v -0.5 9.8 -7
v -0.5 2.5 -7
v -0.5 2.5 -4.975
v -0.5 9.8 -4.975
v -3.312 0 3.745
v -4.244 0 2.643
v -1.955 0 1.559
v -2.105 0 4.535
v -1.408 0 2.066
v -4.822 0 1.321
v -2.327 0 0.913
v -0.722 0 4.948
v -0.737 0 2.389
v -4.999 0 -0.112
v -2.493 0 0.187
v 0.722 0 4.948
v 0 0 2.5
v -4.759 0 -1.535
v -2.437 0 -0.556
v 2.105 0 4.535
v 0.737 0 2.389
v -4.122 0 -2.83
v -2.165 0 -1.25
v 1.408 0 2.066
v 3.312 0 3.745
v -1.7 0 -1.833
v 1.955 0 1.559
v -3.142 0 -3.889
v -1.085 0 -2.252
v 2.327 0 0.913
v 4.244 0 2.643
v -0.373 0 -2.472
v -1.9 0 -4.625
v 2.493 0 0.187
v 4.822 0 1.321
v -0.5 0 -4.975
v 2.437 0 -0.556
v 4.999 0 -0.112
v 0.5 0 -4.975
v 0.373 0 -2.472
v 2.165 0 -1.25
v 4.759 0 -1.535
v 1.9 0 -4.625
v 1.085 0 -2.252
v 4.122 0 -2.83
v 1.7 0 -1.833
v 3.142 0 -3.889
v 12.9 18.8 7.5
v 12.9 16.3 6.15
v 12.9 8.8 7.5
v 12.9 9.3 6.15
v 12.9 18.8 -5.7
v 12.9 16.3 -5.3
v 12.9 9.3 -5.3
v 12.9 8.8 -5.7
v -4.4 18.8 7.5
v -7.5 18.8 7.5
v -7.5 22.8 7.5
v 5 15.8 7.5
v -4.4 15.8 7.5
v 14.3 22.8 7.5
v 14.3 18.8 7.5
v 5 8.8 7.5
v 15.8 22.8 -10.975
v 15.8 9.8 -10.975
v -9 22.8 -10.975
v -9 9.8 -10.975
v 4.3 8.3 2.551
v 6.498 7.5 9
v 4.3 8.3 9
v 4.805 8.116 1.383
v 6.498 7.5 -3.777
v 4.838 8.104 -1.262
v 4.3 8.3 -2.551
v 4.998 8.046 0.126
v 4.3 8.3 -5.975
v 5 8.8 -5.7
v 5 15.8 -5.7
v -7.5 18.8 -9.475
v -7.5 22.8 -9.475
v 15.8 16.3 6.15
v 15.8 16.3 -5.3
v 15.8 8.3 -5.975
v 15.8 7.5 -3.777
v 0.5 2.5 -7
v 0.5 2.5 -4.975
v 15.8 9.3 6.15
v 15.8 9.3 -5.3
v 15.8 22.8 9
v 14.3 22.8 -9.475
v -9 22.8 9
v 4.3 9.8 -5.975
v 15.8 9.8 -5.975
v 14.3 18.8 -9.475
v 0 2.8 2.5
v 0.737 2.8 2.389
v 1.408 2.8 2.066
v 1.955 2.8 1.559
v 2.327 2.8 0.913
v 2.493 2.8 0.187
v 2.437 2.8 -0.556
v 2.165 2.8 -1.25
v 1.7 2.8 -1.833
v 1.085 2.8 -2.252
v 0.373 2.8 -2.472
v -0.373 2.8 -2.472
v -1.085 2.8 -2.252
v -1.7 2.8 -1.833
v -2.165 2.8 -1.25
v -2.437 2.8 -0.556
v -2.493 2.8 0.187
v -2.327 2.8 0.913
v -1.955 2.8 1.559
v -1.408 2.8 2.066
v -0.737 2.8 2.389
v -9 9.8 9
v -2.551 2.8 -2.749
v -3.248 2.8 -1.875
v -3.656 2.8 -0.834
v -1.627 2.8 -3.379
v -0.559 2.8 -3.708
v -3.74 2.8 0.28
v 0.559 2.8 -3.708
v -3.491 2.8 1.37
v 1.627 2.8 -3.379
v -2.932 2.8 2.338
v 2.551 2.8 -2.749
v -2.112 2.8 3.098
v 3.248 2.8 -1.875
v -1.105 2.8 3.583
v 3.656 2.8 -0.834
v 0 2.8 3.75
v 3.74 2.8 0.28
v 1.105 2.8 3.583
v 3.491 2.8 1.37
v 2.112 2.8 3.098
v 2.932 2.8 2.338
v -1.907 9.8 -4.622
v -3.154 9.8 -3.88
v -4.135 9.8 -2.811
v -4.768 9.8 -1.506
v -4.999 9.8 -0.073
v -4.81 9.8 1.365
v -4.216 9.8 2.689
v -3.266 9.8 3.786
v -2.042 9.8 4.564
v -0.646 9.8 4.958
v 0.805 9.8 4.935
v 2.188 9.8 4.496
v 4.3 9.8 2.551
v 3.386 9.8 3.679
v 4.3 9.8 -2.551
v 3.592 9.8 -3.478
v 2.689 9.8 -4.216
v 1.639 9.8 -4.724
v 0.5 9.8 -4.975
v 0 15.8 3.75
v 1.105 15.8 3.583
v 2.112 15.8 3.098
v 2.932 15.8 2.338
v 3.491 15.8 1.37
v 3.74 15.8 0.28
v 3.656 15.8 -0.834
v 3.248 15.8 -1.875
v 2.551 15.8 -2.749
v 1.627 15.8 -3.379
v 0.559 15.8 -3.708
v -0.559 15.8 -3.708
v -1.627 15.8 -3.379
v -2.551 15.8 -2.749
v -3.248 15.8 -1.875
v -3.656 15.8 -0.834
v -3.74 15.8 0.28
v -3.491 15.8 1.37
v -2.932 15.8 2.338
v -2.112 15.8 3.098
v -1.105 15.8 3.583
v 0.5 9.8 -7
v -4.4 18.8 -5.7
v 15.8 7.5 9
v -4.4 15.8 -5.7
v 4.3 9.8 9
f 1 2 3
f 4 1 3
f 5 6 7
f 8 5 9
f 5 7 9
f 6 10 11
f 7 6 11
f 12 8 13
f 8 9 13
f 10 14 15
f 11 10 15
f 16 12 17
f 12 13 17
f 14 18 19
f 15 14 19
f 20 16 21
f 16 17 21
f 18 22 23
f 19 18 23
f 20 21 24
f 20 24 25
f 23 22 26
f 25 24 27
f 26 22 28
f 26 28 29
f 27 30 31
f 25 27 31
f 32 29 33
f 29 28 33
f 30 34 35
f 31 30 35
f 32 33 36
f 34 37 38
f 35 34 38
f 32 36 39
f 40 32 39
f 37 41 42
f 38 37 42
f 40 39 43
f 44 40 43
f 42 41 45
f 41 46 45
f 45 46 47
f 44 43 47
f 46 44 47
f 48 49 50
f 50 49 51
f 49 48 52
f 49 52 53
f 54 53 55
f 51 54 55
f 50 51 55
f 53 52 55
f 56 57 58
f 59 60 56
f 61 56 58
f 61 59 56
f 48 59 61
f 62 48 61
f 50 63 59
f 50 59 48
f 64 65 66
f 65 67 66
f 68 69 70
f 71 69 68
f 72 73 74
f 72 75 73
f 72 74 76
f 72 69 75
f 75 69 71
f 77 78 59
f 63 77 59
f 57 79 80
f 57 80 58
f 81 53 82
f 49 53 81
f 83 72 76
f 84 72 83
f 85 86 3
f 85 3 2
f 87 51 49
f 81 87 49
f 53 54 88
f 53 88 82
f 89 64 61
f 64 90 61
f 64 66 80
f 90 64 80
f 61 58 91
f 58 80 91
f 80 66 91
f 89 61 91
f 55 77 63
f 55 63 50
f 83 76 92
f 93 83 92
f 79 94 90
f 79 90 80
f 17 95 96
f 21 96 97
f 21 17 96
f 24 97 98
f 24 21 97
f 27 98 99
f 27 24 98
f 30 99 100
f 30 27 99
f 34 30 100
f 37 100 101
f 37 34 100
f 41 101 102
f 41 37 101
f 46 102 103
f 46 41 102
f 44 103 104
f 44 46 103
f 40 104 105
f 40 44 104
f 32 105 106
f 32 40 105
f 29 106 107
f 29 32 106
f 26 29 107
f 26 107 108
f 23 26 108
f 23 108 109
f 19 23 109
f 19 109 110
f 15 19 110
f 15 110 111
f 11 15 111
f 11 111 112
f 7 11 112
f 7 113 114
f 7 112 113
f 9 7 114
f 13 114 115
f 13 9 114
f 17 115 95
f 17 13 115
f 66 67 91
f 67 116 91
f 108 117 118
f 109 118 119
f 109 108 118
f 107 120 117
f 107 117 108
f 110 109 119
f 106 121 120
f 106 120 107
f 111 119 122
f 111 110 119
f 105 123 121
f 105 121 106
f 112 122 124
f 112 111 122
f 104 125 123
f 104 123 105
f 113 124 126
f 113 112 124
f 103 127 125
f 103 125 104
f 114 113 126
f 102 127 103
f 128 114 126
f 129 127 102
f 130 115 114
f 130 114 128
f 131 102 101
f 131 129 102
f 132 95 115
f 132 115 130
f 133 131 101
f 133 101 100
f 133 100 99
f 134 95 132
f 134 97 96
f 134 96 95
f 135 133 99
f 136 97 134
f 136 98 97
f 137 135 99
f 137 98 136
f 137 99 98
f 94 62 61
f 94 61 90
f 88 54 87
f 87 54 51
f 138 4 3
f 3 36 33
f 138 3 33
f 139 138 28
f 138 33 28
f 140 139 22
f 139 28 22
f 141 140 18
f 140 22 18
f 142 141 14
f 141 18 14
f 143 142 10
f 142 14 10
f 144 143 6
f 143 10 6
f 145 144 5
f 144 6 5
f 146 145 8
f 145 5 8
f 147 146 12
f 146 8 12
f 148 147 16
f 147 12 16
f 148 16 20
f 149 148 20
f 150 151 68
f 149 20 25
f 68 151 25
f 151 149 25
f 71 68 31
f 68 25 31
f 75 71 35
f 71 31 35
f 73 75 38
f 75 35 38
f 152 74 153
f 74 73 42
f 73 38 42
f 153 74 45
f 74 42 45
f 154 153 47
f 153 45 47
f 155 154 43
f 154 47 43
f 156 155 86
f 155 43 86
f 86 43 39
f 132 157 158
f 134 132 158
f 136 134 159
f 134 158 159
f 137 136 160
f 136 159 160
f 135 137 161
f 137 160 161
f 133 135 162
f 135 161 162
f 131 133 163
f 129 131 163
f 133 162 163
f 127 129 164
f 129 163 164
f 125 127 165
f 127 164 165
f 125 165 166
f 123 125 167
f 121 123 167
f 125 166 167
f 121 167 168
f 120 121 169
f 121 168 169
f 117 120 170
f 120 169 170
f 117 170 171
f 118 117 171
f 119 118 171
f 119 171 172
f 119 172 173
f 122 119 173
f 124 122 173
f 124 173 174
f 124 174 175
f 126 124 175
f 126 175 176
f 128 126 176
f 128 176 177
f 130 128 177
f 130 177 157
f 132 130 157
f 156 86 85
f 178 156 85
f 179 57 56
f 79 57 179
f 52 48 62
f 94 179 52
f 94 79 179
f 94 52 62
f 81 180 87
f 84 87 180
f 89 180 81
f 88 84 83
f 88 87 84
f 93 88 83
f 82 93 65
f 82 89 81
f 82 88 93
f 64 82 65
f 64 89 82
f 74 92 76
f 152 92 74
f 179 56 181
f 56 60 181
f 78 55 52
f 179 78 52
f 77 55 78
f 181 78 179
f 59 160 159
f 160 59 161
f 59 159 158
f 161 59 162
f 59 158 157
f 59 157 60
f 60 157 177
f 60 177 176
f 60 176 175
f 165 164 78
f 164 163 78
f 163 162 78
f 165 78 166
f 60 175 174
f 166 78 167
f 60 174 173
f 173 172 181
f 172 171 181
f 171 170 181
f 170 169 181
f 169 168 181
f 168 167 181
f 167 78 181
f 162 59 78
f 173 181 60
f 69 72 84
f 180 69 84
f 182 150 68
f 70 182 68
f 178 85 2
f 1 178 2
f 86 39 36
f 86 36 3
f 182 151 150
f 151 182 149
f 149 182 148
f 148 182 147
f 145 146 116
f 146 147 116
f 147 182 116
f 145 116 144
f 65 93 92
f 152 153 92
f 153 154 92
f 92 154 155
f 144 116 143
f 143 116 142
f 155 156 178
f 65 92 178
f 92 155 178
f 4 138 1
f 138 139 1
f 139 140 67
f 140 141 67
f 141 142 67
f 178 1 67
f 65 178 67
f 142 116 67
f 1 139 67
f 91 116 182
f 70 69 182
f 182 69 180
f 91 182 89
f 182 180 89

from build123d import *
from OCP.BRepFilletAPI import BRepFilletAPI_MakeChamfer

# Parameters (mm, degrees)
SKETCH1_R            = 4.999999999999999
SKETCH1_R_2          = 2.5
BOSS_EXTRUDE1_DEPTH  = 15.8
SKETCH2_R            = 3.75
CUT_EXTRUDE1_DEPTH   = 13
CUT_EXTRUDE2_DEPTH   = 19.135324645563973
BOSS_EXTRUDE3_DEPTH  = 1
BOSS_EXTRUDE4_DEPTH  = 1
SKETCH13_R           = 5
BOSS_EXTRUDE7_DEPTH  = 10
CUT_EXTRUDE3_START   = -4
CUT_EXTRUDE3_DEPTH   = 4
CUT_EXTRUDE4_DEPTH   = 1
BOSS_EXTRUDE9_DEPTH  = 3
CUT_EXTRUDE6_DEPTH   = 7
BOSS_EXTRUDE10_DEPTH = 3
BOSS_EXTRUDE11_DEPTH = 2
CUT_EXTRUDE7_DEPTH   = 0.25
BOSS_EXTRUDE12_DEPTH = 1
SKETCH23_W           = 18.9749371855331
SKETCH23_H           = 13
BOSS_EXTRUDE13_DEPTH = 1
SKETCH24_W           = 23.799999999999997
SKETCH24_H           = 13
BOSS_EXTRUDE14_DEPTH = 1
BOSS_EXTRUDE15_DEPTH = 1
SKETCH26_W           = 11.45
SKETCH26_H           = 6.999999999999998
SKETCH26_W_2         = 10.45
SKETCH26_H_2         = 5.999999999999998
CUT_EXTRUDE8_DEPTH   = 34.46489573009899
CUT_EXTRUDE10_DEPTH  = 0.7
CHAMFER4_SIZE        = 0.8
CHAMFER4_SIZE2       = 2.1979819355637176


with BuildPart() as part:
    # Sketch1 → Boss-Extrude1 (new body)
    # profile 1 of 2: a face of its own
    with BuildSketch(Plane(origin=(0, 0, 0), x_dir=(1, 0, 0), z_dir=(0, 1, 0))):
        with BuildLine():
            Line((-0.5, 7), (-0.5, 4.9749371855331))
            ThreePointArc((-0.5000000000000004, 4.974937185533099), (3.1e-16, 4.999999999999999), (0.49999999999999994, 4.974937185533099))
            Line((0.5, 4.9749371855331), (0.5, 7))
            Line((0.5, 7), (-0.5, 7))
        make_face()
    # profile 2 of 2: a face of its own
    with BuildSketch(Plane(origin=(0, 0, 0), x_dir=(1, 0, 0), z_dir=(0, 1, 0))):
        Circle(SKETCH1_R)
        with Locations(Location((0, 0, 0), (0, 0, 270))):
            Circle(SKETCH1_R_2, mode=Mode.SUBTRACT)
    extrude(amount=BOSS_EXTRUDE1_DEPTH)

    # Sketch2 → Cut-Extrude1 (cut)
    with BuildSketch(Plane(origin=(0, 15.8, 0), x_dir=(1, 0, 0), z_dir=(0, 1, 0))):
        with Locations(Location((0, 0, 0), (0, 0, 270))):
            Circle(SKETCH2_R)
    extrude(amount=-CUT_EXTRUDE1_DEPTH, mode=Mode.SUBTRACT)

    # Sketch4 → Cut-Extrude2 (cut, through all)
    with BuildSketch(Plane(origin=(0.5, 0, 0), x_dir=(0, 0, -1), z_dir=(1, 0, 0))):
        Polygon((7, 0), (4.9749371855331, 0), (4.9749371855331, 2.5000000000000004), (7, 2.5), align=None)
    extrude(amount=-CUT_EXTRUDE2_DEPTH, mode=Mode.SUBTRACT)

    # Sketch10 → Boss-Extrude3 (add)
    with BuildSketch(Plane(origin=(0.5, 0, 0), x_dir=(0, 0, -1), z_dir=(1, 0, 0))):
        Polygon((4.9749371855331, 15.8), (9.974937185533099, 15.8), (9.974937185533099, 9.8), (4.974937185533101, 9.8), align=None)
    extrude(amount=-BOSS_EXTRUDE3_DEPTH)

    # Sketch12 → Boss-Extrude4 (add)
    with BuildSketch(Plane(origin=(0, 15.8, 0), x_dir=(1, 0, 0), z_dir=(0, 1, 0))):
        with BuildLine():
            Line((-3.75, -3.307189138830739), (-3.75, 3.307189138830739))
            ThreePointArc((-3.75, 3.307189138830739), (-5.000000000000001, -6.1e-16), (-3.75, -3.307189138830739))
        make_face()
    extrude(amount=BOSS_EXTRUDE4_DEPTH)

    # Sketch13 → Boss-Extrude7 (add)
    with BuildSketch(Plane.XZ.offset(-9.8)):
        Polygon((-8, 8), (14.799999999999997, 8), (14.8, -9.974937185533099), (-7.999999999999998, -9.974937185533099), align=None)
        with Locations(Location((0, 0, 0), (0, 0, 221.409622109))):
            Circle(SKETCH13_R, mode=Mode.SUBTRACT)
    extrude(amount=-BOSS_EXTRUDE7_DEPTH)

    # Sketch14 → Cut-Extrude3 (cut)
    with BuildSketch(Plane(origin=(0, 19.8, 0), x_dir=(1, 0, 0), z_dir=(0, 1, 0)).offset(CUT_EXTRUDE3_START)):
        Polygon((-4.400000000000001, 5.7), (10.299999999999999, 5.7), (12.899999999999999, 5.7), (12.899999999999999, -7.249999999999999), (10.3, -7.249999999999999), (-4.400000000000001, -7.249999999999999), align=None)
    extrude(amount=CUT_EXTRUDE3_DEPTH, mode=Mode.SUBTRACT)

    # Sketch15 → Cut-Extrude4 (cut)
    with BuildSketch(Plane(origin=(0, 19.8, 0), x_dir=(1, 0, 0), z_dir=(0, 1, 0))):
        Polygon((-7.499999999999998, 9.474937185533099), (-7.5, -7.5), (14.299999999999997, -7.5), (14.3, 9.474937185533099), align=None)
    extrude(amount=-CUT_EXTRUDE4_DEPTH, mode=Mode.SUBTRACT)

    # Sketch17 → Boss-Extrude9 (add)
    with BuildSketch(Plane.XZ.offset(-9.8)):
        Polygon((14.8, -5.974937185533098), (4.3, -5.974937185533099), (4.3, 8), (14.8, 8), align=None)
    extrude(amount=BOSS_EXTRUDE9_DEPTH)

    # Sketch16 → Cut-Extrude6 (cut)
    with BuildSketch(Plane(origin=(0, 15.8, 0), x_dir=(1, 0, 0), z_dir=(0, 1, 0))):
        Polygon((12.899999999999999, 5.7), (4.999999999999999, 5.699999999999999), (5.000000000000001, -7.249999999999999), (12.9, -7.249999999999999), align=None)
    extrude(amount=-CUT_EXTRUDE6_DEPTH, mode=Mode.SUBTRACT)

    # Sketch19 → Boss-Extrude10 (add)
    with BuildSketch(Plane(origin=(0, 19.8, 0), x_dir=(1, 0, 0), z_dir=(0, 1, 0))):
        Polygon((-7.999999999999998, 9.974937185533099), (-8, -8), (14.799999999999997, -8), (14.8, 9.974937185533099), align=None)
        Polygon((-7.5, -7.5), (14.299999999999997, -7.5), (14.3, 9.474937185533099), (-7.499999999999998, 9.474937185533099), align=None, mode=Mode.SUBTRACT)
    extrude(amount=BOSS_EXTRUDE10_DEPTH)

    # Sketch20 → Boss-Extrude11 (add)
    with BuildSketch(Plane(origin=(0, 16.8, 0), x_dir=(1, 0, 0), z_dir=(0, 1, 0))):
        with BuildLine():
            Line((-4.400000000000002, -2.37486841740758), (-4.400000000000001, 2.374868417407581))
            ThreePointArc((-4.400000000000001, 2.374868417407581), (-5, 6.1e-16), (-4.400000000000002, -2.37486841740758))
        make_face()
    extrude(amount=BOSS_EXTRUDE11_DEPTH)

    # Sketch21 → Cut-Extrude7 (cut)
    with BuildSketch(Plane(origin=(0, 0, 7.249999999999999), x_dir=(-1, 0, 0), z_dir=(0, 0, -1))):
        Polygon((4.400000000000001, 18.8), (-12.899999999999999, 18.8), (-12.9, 8.800000000000002), (-5.000000000000001, 8.800000000000002), (-5.000000000000001, 15.8), (4.400000000000001, 15.8), align=None)
    extrude(amount=-CUT_EXTRUDE7_DEPTH, mode=Mode.SUBTRACT)

    # Sketch22 → Boss-Extrude12 (add)
    with BuildSketch(Plane.XY.offset(8)):
        Polygon((14.8, 6.800000000000002), (14.799999999999997, 22.8), (-8, 22.8), (-8, 9.8), (4.3, 9.8), (4.3, 6.800000000000002), align=None)
    extrude(amount=BOSS_EXTRUDE12_DEPTH)

    # Sketch23 → Boss-Extrude13 (add)
    with BuildSketch(Plane.ZY.offset(8)):
        with Locations((-0.4874685927665485, 16.3)):
            Rectangle(SKETCH23_W, SKETCH23_H)
    extrude(amount=BOSS_EXTRUDE13_DEPTH)

    # Sketch24 → Boss-Extrude14 (add)
    with BuildSketch(Plane(origin=(0, 0, -9.974937185533099), x_dir=(-1, 0, 0), z_dir=(0, 0, -1))):
        with Locations((-2.9000000000000012, 16.3)):
            Rectangle(SKETCH24_W, SKETCH24_H)
    extrude(amount=BOSS_EXTRUDE14_DEPTH)

    # Sketch25 → Boss-Extrude15 (add)
    with BuildSketch(Plane(origin=(14.799999999999999, 0, 2.86e-15), x_dir=(1.9e-16, 0, -1), z_dir=(1, 0, 1.9e-16))):
        Polygon((5.974937185533101, 9.8), (10.974937185533104, 9.8), (10.974937185533104, 22.8), (-8.999999999999998, 22.8), (-8.999999999999998, 6.800000000000002), (5.974937185533101, 6.800000000000002), align=None)
    extrude(amount=BOSS_EXTRUDE15_DEPTH)

    # Sketch26 → Cut-Extrude8 (cut, through all)
    with BuildSketch(Plane.ZY.offset(-12.899999999999999)):
        with Locations((0.42500000000000027, 12.8)):
            Rectangle(SKETCH26_W, SKETCH26_H)
        with Locations((0.4249999999999998, 12.8)):
            Rectangle(SKETCH26_W_2, SKETCH26_H_2)
    extrude(amount=-CUT_EXTRUDE8_DEPTH, mode=Mode.SUBTRACT)

    # Sketch28 → Cut-Extrude10 (cut)
    with BuildSketch(Plane.XZ.offset(-6.800000000000002)):
        with BuildLine():
            Line((4.3, -2.551470164434614), (4.3, -5.974937185533099))
            Line((4.3, -5.974937185533099), (15.8, -5.974937185533098))
            Line((15.8, -5.974937185533098), (15.799999999999999, 9.000000000000002))
            Line((15.799999999999999, 9.000000000000002), (4.3, 9.000000000000002))
            Line((4.3, 9.000000000000002), (4.3, 2.5514701644346127))
            ThreePointArc((4.3, 2.5514701644346127), (4.999999999999999, -5.6e-16), (4.3, -2.551470164434614))
        make_face()
    extrude(amount=-CUT_EXTRUDE10_DEPTH, mode=Mode.SUBTRACT)

    # Chamfer4: one chamfer whose edges measure the first distance from different faces: ONE call of the kernel's chamfer builder (chamfer() names one face for all edges)
    chamfer4_edges_1 = [part.edges().sort_by_distance(p)[0] for p in [
        (10.05, 7.500000000000002, -5.974937185533099),
    ]]
    chamfer4_side_1 = [part.faces().sort_by_distance(p)[0] for p in [
        (10.049999999999999, 8.65, -5.974937185533099),
    ]]
    chamfer4_edges_2 = [part.edges().sort_by_distance(p)[0] for p in [
        (4.3, 7.500000000000002, -4.263203674983856),
    ]]
    chamfer4_side_2 = [part.faces().sort_by_distance(p)[0] for p in [
        (4.3, 8.650000000000002, -4.263203674983856),
    ]]
    chamfer4 = BRepFilletAPI_MakeChamfer(part.part.solid().wrapped)
    for e in chamfer4_edges_1:
        chamfer4.Add(CHAMFER4_SIZE, CHAMFER4_SIZE2, e.wrapped, chamfer4_side_1[0].wrapped)  # the first distance lies on this face
    for e in chamfer4_edges_2:
        chamfer4.Add(CHAMFER4_SIZE, CHAMFER4_SIZE2, e.wrapped, chamfer4_side_2[0].wrapped)  # the first distance lies on this face
    add(Compound.cast(chamfer4.Shape()), mode=Mode.REPLACE)


solid = part.part
